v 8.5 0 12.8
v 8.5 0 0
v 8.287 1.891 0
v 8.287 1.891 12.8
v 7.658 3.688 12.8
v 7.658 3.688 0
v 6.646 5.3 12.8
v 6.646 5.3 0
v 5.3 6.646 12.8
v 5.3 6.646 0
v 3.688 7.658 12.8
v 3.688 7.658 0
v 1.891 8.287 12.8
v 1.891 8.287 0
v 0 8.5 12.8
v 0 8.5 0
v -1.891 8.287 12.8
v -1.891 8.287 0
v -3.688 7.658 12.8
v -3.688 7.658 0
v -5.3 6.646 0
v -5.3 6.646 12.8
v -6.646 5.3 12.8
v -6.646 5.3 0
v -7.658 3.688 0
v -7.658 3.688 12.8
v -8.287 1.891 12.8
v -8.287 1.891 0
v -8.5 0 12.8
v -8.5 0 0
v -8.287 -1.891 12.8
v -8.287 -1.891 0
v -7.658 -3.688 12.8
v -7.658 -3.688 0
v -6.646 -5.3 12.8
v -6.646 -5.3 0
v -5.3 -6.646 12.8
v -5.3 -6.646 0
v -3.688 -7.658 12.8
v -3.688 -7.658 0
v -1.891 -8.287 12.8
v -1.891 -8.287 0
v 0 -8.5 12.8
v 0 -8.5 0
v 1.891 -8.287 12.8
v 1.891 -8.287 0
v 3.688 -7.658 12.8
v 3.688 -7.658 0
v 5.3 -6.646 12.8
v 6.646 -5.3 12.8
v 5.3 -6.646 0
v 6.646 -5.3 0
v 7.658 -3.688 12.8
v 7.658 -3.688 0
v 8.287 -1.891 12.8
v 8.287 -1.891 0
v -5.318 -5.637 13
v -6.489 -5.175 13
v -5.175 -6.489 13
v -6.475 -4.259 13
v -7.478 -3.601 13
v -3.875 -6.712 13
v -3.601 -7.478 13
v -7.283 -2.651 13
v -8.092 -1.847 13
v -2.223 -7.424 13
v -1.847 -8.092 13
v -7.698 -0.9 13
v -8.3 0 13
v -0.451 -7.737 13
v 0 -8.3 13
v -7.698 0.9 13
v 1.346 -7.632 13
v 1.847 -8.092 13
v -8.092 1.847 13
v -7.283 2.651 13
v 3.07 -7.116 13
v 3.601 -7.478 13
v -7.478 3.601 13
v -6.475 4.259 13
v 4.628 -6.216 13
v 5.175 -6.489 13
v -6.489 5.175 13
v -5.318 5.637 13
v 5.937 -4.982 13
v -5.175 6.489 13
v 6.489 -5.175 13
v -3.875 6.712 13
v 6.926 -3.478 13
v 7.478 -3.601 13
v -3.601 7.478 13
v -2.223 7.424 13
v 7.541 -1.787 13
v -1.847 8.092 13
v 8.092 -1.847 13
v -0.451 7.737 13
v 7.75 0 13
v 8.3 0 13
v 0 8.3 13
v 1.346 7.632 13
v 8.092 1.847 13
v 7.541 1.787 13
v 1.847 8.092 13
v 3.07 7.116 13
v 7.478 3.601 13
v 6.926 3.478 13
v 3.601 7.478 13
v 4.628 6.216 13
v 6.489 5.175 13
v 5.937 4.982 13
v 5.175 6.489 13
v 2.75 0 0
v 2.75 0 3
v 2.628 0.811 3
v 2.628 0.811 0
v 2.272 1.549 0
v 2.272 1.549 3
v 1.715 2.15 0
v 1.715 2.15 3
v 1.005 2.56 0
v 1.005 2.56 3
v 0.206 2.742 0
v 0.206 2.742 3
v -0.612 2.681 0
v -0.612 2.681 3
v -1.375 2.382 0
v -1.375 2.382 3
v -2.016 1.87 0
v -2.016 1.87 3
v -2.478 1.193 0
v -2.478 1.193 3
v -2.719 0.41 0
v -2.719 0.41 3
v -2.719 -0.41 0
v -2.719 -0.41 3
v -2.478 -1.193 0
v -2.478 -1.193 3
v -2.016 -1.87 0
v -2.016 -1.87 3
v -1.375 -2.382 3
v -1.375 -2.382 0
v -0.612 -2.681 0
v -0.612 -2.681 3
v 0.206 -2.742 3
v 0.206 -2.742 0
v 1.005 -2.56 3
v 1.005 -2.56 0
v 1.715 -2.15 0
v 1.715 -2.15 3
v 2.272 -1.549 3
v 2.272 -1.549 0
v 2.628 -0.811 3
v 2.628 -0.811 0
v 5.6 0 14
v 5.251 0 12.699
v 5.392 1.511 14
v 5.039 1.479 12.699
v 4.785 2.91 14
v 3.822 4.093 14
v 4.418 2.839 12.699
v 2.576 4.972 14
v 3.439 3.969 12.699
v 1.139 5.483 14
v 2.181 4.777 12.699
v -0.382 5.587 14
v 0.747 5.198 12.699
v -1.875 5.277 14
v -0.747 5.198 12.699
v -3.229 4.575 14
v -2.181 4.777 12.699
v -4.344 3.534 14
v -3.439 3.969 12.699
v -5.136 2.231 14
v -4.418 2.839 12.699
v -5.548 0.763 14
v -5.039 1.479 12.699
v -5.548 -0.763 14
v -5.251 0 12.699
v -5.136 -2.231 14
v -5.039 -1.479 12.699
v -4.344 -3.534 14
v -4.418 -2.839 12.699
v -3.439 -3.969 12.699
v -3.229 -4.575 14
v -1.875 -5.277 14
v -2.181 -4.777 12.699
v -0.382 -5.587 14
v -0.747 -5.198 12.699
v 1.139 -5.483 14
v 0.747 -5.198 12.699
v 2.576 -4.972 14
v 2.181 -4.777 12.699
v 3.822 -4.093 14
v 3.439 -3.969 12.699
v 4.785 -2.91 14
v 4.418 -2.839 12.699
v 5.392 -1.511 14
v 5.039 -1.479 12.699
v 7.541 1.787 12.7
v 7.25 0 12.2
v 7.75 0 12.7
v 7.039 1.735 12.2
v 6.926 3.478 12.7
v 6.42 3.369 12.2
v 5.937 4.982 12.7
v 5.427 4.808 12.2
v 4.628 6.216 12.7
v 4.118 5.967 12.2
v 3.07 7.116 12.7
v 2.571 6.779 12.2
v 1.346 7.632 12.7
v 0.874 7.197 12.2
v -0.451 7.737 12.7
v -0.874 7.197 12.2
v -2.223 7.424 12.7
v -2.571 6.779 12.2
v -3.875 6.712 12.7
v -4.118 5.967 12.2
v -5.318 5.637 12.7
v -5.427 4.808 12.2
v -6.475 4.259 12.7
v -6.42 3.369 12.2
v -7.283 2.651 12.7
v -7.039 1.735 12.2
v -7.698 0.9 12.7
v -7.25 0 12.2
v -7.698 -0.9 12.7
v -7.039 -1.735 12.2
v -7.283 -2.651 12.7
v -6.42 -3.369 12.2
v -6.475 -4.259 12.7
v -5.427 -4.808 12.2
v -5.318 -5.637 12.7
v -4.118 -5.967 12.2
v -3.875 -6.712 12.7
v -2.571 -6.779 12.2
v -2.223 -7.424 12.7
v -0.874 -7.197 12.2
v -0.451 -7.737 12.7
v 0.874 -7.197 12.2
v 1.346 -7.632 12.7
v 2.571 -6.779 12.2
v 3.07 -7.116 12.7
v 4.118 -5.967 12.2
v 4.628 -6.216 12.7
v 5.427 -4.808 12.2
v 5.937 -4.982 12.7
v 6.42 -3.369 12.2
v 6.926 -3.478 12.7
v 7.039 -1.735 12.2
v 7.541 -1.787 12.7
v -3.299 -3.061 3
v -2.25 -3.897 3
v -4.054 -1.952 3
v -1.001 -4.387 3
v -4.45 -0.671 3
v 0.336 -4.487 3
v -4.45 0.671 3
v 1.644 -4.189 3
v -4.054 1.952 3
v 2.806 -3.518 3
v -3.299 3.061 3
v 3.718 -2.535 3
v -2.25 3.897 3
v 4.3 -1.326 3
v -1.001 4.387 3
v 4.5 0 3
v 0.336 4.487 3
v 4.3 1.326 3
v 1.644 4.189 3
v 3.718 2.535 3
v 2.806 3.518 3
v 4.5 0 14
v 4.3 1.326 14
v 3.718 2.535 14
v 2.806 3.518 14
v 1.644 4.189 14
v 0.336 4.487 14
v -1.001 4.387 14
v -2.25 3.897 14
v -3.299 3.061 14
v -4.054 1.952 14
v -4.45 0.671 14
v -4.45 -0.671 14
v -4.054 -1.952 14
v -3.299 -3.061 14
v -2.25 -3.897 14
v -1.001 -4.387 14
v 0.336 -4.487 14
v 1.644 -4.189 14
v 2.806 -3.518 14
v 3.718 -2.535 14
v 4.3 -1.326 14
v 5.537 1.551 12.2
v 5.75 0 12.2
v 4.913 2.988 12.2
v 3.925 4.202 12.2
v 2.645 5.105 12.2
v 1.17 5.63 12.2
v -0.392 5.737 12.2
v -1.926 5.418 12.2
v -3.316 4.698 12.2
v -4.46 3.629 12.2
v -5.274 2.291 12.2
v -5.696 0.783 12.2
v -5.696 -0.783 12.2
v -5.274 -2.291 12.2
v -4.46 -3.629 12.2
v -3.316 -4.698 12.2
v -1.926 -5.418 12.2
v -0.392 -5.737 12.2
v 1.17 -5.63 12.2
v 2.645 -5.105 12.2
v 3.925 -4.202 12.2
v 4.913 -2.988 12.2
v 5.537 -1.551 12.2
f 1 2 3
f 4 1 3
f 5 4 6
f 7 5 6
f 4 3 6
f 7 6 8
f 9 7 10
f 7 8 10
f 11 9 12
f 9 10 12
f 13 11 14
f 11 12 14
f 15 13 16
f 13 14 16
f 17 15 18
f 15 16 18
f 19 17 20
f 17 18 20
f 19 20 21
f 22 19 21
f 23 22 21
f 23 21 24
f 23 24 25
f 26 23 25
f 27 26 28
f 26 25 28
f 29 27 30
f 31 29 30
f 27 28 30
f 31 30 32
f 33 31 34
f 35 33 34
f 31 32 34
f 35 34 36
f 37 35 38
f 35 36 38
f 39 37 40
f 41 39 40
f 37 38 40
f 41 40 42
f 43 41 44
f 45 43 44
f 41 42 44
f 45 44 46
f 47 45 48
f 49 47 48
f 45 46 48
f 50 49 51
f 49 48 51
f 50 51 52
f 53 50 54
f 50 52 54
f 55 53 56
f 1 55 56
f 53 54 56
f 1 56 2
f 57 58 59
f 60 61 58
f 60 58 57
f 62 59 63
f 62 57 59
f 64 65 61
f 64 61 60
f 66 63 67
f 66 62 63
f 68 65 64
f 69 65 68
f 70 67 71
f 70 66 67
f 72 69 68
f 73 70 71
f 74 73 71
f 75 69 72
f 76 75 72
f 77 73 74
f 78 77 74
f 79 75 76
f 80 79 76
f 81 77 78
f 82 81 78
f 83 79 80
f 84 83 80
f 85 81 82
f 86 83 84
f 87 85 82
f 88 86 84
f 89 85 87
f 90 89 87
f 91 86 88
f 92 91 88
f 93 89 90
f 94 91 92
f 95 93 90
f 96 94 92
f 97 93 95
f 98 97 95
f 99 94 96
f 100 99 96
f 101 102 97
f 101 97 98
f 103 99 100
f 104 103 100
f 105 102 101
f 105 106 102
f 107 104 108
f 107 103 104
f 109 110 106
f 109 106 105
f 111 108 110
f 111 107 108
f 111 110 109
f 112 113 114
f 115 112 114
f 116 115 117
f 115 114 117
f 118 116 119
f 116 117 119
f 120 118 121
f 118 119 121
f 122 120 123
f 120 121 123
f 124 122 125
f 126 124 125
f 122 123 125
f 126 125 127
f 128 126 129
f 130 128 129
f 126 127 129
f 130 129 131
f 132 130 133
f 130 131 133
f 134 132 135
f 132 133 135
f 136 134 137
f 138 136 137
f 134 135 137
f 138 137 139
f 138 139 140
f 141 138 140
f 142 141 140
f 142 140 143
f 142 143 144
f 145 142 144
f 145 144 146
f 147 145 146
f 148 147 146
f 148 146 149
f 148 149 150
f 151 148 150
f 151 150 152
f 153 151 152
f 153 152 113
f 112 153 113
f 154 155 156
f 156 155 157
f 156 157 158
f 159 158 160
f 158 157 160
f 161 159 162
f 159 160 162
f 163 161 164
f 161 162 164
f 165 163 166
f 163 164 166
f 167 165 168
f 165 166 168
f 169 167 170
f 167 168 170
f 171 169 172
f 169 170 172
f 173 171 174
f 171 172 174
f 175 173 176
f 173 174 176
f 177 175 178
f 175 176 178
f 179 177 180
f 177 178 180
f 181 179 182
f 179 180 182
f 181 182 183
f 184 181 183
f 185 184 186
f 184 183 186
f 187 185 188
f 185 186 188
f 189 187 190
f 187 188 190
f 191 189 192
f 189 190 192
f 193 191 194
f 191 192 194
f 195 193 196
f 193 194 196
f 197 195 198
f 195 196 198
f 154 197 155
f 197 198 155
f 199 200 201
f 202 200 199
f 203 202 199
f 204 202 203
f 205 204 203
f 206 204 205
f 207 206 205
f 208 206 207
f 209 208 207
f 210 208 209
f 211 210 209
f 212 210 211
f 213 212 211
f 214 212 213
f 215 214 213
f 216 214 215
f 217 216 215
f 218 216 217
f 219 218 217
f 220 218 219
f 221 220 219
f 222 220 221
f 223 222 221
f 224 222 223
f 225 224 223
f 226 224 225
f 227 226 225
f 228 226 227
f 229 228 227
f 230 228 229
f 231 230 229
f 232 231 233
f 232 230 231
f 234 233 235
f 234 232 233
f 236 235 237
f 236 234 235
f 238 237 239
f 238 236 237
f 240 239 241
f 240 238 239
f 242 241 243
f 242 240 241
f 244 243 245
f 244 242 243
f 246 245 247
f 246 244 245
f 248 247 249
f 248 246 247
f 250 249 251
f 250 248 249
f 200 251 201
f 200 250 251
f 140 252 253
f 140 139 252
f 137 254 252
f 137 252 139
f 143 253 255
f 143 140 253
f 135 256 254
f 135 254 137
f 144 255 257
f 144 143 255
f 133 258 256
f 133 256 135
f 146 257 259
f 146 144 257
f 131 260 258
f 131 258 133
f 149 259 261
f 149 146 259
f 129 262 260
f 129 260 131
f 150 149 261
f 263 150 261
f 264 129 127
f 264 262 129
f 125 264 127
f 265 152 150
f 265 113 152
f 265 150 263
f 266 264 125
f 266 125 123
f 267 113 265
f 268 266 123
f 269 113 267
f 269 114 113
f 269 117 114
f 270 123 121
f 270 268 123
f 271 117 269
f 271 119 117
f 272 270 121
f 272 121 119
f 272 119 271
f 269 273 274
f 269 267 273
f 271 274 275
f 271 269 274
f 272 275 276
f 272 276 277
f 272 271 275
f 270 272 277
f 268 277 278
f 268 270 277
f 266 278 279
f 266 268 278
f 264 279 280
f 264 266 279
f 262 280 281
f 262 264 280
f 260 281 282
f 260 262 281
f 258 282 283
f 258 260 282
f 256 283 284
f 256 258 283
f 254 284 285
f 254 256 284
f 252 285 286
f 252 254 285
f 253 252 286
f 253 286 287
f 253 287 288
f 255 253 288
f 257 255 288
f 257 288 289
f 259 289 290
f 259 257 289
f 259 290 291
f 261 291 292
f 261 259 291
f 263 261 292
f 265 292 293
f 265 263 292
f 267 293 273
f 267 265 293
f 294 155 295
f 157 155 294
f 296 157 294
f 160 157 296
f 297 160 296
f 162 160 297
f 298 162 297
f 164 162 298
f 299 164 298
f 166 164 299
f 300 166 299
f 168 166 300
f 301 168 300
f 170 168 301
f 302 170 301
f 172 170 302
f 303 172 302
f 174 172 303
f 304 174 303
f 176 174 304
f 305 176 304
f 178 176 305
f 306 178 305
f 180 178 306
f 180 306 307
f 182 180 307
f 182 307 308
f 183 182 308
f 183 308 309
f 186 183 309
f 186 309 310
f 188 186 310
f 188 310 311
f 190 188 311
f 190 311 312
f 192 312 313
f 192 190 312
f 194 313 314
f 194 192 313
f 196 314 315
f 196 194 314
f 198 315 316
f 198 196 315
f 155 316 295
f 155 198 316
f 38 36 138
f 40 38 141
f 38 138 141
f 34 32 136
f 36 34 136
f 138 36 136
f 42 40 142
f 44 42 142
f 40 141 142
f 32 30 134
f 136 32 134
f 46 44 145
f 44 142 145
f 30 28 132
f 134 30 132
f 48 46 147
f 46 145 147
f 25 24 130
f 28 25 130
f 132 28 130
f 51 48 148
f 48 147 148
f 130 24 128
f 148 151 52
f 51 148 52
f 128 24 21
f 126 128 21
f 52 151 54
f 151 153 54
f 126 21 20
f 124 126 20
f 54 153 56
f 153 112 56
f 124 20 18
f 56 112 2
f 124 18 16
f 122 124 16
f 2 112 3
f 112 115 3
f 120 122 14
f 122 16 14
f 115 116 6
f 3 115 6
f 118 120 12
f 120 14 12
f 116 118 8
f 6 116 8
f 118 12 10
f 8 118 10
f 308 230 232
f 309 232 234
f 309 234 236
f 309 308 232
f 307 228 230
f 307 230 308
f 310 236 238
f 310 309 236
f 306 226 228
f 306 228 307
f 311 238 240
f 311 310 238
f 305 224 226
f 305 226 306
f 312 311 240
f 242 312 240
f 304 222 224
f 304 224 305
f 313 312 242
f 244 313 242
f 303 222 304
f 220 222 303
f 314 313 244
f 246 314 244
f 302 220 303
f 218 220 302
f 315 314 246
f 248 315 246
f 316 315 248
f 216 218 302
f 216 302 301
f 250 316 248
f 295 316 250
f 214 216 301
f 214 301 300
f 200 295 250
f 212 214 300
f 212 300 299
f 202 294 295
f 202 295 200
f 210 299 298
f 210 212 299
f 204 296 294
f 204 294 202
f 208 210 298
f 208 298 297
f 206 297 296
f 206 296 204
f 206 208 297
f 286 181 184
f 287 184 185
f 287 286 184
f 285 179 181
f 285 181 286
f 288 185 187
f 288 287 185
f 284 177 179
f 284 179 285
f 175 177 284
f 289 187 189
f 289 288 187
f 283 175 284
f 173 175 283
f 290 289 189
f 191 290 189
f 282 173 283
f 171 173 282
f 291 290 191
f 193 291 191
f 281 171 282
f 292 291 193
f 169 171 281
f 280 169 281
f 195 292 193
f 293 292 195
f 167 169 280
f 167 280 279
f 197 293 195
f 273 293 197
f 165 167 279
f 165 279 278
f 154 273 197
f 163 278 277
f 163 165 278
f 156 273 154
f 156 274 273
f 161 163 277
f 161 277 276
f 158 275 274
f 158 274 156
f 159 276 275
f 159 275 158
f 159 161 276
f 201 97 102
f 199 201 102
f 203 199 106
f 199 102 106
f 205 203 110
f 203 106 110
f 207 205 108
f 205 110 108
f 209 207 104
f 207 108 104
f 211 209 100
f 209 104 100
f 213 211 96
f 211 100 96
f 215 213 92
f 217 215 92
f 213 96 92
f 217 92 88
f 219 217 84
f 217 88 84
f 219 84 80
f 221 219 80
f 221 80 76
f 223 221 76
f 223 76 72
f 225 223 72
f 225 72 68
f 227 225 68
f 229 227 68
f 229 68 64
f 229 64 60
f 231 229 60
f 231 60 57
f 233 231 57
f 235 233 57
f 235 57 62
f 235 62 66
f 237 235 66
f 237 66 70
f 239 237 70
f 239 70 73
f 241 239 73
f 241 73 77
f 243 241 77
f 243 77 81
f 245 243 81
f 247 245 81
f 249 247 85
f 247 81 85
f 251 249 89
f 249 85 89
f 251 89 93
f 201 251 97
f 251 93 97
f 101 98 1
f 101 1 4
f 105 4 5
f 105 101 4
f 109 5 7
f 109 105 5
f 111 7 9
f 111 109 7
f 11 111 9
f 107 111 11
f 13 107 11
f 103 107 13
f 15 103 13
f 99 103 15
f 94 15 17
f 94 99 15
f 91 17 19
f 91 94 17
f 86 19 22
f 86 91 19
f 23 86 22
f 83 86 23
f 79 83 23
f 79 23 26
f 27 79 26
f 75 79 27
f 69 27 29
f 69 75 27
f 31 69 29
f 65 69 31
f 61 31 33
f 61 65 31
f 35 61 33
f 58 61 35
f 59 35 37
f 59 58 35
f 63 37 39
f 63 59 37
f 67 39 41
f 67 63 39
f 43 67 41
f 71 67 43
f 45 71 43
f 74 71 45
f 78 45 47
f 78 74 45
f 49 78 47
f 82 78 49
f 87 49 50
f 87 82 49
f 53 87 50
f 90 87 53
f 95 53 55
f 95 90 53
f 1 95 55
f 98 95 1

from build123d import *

# Parameters (mm, degrees)
F0_R      = 8.5
F1_DEPTH  = 13
F2_R      = 2.75
F3_DEPTH  = 13.001
F4_R      = 4.5
F5_DEPTH  = 10
F6_SIZE   = 0.2
F7_R      = 7.75
F7_R_2    = 5.25
F8_DEPTH  = 0.8
F9_DEPTH  = 1
F10_R     = 5.6
F10_R_2   = 4.5
F11_DEPTH = 1.5
F11_TAPER = 15


# Not quite as in the source:
# - a fillet or chamfer that OpenCascade refuses, or shapes differently, is made with other operations: its cross-section is extruded or revolved along the edge and cut away or added
# - a feature names something its author has since deleted; it is built from what else it names


with BuildPart() as f1:
    # F0 (on Top) → F1 (new body)
    with BuildSketch(Plane.XY):
        Circle(F0_R)
    extrude(amount=F1_DEPTH)

    # F2 (on face) → F3 (cut, through all)
    with BuildSketch(Plane.XY.offset(13)):
        Circle(F2_R)
    extrude(amount=-F3_DEPTH, mode=Mode.SUBTRACT)

    # F4 (on face) → F5 (cut)
    with BuildSketch(Plane.XY.offset(13)):
        Circle(F4_R)
    extrude(amount=-F5_DEPTH, mode=Mode.SUBTRACT)

    # F6
    f6_edges = [f1.edges().sort_by_distance(p)[0] for p in [
        (-8.5, 0, 13),
    ]]
    chamfer(f6_edges, length=F6_SIZE)

    # F7 (on face) → F8 (cut)
    with BuildSketch(Plane.XY.offset(13)):
        Circle(F7_R)
        Circle(F7_R_2, mode=Mode.SUBTRACT)
    extrude(amount=-F8_DEPTH, mode=Mode.SUBTRACT)

    # F9 (add): a face of the model
    f9_faces = [f1.faces().sort_by_distance(p)[0] for p in [
        (-5.101507576, 0, 13),
    ]]
    extrude(f9_faces, amount=F9_DEPTH)

    # F10 (on face) → F11 (join)
    with BuildSketch(Plane.XY.offset(14)):
        Circle(F10_R)
        Circle(F10_R_2, mode=Mode.SUBTRACT)
    extrude(amount=-F11_DEPTH, taper=F11_TAPER)

    # F12: chamfer of 0.5 on 2 edges, made by hand

    # F12_s1 → F12_t2 (revolve)
    with BuildSketch(Plane.XZ):
        Polygon((7.75, 12.7), (7.25, 12.2), (7.75, 12.2), align=None)
    revolve(axis=Axis((0, 0, 12.2), (0, 0, 1)))

    # F12_s3 → F12_t4 (revolve)
    with BuildSketch(Plane.XZ):
        Polygon((5.75, 12.2), (5.25, 12.7), (5.25, 12.2), align=None)
    revolve(axis=Axis((0, 0, 12.2), (0, 0, 1)))


solid = f1.part
